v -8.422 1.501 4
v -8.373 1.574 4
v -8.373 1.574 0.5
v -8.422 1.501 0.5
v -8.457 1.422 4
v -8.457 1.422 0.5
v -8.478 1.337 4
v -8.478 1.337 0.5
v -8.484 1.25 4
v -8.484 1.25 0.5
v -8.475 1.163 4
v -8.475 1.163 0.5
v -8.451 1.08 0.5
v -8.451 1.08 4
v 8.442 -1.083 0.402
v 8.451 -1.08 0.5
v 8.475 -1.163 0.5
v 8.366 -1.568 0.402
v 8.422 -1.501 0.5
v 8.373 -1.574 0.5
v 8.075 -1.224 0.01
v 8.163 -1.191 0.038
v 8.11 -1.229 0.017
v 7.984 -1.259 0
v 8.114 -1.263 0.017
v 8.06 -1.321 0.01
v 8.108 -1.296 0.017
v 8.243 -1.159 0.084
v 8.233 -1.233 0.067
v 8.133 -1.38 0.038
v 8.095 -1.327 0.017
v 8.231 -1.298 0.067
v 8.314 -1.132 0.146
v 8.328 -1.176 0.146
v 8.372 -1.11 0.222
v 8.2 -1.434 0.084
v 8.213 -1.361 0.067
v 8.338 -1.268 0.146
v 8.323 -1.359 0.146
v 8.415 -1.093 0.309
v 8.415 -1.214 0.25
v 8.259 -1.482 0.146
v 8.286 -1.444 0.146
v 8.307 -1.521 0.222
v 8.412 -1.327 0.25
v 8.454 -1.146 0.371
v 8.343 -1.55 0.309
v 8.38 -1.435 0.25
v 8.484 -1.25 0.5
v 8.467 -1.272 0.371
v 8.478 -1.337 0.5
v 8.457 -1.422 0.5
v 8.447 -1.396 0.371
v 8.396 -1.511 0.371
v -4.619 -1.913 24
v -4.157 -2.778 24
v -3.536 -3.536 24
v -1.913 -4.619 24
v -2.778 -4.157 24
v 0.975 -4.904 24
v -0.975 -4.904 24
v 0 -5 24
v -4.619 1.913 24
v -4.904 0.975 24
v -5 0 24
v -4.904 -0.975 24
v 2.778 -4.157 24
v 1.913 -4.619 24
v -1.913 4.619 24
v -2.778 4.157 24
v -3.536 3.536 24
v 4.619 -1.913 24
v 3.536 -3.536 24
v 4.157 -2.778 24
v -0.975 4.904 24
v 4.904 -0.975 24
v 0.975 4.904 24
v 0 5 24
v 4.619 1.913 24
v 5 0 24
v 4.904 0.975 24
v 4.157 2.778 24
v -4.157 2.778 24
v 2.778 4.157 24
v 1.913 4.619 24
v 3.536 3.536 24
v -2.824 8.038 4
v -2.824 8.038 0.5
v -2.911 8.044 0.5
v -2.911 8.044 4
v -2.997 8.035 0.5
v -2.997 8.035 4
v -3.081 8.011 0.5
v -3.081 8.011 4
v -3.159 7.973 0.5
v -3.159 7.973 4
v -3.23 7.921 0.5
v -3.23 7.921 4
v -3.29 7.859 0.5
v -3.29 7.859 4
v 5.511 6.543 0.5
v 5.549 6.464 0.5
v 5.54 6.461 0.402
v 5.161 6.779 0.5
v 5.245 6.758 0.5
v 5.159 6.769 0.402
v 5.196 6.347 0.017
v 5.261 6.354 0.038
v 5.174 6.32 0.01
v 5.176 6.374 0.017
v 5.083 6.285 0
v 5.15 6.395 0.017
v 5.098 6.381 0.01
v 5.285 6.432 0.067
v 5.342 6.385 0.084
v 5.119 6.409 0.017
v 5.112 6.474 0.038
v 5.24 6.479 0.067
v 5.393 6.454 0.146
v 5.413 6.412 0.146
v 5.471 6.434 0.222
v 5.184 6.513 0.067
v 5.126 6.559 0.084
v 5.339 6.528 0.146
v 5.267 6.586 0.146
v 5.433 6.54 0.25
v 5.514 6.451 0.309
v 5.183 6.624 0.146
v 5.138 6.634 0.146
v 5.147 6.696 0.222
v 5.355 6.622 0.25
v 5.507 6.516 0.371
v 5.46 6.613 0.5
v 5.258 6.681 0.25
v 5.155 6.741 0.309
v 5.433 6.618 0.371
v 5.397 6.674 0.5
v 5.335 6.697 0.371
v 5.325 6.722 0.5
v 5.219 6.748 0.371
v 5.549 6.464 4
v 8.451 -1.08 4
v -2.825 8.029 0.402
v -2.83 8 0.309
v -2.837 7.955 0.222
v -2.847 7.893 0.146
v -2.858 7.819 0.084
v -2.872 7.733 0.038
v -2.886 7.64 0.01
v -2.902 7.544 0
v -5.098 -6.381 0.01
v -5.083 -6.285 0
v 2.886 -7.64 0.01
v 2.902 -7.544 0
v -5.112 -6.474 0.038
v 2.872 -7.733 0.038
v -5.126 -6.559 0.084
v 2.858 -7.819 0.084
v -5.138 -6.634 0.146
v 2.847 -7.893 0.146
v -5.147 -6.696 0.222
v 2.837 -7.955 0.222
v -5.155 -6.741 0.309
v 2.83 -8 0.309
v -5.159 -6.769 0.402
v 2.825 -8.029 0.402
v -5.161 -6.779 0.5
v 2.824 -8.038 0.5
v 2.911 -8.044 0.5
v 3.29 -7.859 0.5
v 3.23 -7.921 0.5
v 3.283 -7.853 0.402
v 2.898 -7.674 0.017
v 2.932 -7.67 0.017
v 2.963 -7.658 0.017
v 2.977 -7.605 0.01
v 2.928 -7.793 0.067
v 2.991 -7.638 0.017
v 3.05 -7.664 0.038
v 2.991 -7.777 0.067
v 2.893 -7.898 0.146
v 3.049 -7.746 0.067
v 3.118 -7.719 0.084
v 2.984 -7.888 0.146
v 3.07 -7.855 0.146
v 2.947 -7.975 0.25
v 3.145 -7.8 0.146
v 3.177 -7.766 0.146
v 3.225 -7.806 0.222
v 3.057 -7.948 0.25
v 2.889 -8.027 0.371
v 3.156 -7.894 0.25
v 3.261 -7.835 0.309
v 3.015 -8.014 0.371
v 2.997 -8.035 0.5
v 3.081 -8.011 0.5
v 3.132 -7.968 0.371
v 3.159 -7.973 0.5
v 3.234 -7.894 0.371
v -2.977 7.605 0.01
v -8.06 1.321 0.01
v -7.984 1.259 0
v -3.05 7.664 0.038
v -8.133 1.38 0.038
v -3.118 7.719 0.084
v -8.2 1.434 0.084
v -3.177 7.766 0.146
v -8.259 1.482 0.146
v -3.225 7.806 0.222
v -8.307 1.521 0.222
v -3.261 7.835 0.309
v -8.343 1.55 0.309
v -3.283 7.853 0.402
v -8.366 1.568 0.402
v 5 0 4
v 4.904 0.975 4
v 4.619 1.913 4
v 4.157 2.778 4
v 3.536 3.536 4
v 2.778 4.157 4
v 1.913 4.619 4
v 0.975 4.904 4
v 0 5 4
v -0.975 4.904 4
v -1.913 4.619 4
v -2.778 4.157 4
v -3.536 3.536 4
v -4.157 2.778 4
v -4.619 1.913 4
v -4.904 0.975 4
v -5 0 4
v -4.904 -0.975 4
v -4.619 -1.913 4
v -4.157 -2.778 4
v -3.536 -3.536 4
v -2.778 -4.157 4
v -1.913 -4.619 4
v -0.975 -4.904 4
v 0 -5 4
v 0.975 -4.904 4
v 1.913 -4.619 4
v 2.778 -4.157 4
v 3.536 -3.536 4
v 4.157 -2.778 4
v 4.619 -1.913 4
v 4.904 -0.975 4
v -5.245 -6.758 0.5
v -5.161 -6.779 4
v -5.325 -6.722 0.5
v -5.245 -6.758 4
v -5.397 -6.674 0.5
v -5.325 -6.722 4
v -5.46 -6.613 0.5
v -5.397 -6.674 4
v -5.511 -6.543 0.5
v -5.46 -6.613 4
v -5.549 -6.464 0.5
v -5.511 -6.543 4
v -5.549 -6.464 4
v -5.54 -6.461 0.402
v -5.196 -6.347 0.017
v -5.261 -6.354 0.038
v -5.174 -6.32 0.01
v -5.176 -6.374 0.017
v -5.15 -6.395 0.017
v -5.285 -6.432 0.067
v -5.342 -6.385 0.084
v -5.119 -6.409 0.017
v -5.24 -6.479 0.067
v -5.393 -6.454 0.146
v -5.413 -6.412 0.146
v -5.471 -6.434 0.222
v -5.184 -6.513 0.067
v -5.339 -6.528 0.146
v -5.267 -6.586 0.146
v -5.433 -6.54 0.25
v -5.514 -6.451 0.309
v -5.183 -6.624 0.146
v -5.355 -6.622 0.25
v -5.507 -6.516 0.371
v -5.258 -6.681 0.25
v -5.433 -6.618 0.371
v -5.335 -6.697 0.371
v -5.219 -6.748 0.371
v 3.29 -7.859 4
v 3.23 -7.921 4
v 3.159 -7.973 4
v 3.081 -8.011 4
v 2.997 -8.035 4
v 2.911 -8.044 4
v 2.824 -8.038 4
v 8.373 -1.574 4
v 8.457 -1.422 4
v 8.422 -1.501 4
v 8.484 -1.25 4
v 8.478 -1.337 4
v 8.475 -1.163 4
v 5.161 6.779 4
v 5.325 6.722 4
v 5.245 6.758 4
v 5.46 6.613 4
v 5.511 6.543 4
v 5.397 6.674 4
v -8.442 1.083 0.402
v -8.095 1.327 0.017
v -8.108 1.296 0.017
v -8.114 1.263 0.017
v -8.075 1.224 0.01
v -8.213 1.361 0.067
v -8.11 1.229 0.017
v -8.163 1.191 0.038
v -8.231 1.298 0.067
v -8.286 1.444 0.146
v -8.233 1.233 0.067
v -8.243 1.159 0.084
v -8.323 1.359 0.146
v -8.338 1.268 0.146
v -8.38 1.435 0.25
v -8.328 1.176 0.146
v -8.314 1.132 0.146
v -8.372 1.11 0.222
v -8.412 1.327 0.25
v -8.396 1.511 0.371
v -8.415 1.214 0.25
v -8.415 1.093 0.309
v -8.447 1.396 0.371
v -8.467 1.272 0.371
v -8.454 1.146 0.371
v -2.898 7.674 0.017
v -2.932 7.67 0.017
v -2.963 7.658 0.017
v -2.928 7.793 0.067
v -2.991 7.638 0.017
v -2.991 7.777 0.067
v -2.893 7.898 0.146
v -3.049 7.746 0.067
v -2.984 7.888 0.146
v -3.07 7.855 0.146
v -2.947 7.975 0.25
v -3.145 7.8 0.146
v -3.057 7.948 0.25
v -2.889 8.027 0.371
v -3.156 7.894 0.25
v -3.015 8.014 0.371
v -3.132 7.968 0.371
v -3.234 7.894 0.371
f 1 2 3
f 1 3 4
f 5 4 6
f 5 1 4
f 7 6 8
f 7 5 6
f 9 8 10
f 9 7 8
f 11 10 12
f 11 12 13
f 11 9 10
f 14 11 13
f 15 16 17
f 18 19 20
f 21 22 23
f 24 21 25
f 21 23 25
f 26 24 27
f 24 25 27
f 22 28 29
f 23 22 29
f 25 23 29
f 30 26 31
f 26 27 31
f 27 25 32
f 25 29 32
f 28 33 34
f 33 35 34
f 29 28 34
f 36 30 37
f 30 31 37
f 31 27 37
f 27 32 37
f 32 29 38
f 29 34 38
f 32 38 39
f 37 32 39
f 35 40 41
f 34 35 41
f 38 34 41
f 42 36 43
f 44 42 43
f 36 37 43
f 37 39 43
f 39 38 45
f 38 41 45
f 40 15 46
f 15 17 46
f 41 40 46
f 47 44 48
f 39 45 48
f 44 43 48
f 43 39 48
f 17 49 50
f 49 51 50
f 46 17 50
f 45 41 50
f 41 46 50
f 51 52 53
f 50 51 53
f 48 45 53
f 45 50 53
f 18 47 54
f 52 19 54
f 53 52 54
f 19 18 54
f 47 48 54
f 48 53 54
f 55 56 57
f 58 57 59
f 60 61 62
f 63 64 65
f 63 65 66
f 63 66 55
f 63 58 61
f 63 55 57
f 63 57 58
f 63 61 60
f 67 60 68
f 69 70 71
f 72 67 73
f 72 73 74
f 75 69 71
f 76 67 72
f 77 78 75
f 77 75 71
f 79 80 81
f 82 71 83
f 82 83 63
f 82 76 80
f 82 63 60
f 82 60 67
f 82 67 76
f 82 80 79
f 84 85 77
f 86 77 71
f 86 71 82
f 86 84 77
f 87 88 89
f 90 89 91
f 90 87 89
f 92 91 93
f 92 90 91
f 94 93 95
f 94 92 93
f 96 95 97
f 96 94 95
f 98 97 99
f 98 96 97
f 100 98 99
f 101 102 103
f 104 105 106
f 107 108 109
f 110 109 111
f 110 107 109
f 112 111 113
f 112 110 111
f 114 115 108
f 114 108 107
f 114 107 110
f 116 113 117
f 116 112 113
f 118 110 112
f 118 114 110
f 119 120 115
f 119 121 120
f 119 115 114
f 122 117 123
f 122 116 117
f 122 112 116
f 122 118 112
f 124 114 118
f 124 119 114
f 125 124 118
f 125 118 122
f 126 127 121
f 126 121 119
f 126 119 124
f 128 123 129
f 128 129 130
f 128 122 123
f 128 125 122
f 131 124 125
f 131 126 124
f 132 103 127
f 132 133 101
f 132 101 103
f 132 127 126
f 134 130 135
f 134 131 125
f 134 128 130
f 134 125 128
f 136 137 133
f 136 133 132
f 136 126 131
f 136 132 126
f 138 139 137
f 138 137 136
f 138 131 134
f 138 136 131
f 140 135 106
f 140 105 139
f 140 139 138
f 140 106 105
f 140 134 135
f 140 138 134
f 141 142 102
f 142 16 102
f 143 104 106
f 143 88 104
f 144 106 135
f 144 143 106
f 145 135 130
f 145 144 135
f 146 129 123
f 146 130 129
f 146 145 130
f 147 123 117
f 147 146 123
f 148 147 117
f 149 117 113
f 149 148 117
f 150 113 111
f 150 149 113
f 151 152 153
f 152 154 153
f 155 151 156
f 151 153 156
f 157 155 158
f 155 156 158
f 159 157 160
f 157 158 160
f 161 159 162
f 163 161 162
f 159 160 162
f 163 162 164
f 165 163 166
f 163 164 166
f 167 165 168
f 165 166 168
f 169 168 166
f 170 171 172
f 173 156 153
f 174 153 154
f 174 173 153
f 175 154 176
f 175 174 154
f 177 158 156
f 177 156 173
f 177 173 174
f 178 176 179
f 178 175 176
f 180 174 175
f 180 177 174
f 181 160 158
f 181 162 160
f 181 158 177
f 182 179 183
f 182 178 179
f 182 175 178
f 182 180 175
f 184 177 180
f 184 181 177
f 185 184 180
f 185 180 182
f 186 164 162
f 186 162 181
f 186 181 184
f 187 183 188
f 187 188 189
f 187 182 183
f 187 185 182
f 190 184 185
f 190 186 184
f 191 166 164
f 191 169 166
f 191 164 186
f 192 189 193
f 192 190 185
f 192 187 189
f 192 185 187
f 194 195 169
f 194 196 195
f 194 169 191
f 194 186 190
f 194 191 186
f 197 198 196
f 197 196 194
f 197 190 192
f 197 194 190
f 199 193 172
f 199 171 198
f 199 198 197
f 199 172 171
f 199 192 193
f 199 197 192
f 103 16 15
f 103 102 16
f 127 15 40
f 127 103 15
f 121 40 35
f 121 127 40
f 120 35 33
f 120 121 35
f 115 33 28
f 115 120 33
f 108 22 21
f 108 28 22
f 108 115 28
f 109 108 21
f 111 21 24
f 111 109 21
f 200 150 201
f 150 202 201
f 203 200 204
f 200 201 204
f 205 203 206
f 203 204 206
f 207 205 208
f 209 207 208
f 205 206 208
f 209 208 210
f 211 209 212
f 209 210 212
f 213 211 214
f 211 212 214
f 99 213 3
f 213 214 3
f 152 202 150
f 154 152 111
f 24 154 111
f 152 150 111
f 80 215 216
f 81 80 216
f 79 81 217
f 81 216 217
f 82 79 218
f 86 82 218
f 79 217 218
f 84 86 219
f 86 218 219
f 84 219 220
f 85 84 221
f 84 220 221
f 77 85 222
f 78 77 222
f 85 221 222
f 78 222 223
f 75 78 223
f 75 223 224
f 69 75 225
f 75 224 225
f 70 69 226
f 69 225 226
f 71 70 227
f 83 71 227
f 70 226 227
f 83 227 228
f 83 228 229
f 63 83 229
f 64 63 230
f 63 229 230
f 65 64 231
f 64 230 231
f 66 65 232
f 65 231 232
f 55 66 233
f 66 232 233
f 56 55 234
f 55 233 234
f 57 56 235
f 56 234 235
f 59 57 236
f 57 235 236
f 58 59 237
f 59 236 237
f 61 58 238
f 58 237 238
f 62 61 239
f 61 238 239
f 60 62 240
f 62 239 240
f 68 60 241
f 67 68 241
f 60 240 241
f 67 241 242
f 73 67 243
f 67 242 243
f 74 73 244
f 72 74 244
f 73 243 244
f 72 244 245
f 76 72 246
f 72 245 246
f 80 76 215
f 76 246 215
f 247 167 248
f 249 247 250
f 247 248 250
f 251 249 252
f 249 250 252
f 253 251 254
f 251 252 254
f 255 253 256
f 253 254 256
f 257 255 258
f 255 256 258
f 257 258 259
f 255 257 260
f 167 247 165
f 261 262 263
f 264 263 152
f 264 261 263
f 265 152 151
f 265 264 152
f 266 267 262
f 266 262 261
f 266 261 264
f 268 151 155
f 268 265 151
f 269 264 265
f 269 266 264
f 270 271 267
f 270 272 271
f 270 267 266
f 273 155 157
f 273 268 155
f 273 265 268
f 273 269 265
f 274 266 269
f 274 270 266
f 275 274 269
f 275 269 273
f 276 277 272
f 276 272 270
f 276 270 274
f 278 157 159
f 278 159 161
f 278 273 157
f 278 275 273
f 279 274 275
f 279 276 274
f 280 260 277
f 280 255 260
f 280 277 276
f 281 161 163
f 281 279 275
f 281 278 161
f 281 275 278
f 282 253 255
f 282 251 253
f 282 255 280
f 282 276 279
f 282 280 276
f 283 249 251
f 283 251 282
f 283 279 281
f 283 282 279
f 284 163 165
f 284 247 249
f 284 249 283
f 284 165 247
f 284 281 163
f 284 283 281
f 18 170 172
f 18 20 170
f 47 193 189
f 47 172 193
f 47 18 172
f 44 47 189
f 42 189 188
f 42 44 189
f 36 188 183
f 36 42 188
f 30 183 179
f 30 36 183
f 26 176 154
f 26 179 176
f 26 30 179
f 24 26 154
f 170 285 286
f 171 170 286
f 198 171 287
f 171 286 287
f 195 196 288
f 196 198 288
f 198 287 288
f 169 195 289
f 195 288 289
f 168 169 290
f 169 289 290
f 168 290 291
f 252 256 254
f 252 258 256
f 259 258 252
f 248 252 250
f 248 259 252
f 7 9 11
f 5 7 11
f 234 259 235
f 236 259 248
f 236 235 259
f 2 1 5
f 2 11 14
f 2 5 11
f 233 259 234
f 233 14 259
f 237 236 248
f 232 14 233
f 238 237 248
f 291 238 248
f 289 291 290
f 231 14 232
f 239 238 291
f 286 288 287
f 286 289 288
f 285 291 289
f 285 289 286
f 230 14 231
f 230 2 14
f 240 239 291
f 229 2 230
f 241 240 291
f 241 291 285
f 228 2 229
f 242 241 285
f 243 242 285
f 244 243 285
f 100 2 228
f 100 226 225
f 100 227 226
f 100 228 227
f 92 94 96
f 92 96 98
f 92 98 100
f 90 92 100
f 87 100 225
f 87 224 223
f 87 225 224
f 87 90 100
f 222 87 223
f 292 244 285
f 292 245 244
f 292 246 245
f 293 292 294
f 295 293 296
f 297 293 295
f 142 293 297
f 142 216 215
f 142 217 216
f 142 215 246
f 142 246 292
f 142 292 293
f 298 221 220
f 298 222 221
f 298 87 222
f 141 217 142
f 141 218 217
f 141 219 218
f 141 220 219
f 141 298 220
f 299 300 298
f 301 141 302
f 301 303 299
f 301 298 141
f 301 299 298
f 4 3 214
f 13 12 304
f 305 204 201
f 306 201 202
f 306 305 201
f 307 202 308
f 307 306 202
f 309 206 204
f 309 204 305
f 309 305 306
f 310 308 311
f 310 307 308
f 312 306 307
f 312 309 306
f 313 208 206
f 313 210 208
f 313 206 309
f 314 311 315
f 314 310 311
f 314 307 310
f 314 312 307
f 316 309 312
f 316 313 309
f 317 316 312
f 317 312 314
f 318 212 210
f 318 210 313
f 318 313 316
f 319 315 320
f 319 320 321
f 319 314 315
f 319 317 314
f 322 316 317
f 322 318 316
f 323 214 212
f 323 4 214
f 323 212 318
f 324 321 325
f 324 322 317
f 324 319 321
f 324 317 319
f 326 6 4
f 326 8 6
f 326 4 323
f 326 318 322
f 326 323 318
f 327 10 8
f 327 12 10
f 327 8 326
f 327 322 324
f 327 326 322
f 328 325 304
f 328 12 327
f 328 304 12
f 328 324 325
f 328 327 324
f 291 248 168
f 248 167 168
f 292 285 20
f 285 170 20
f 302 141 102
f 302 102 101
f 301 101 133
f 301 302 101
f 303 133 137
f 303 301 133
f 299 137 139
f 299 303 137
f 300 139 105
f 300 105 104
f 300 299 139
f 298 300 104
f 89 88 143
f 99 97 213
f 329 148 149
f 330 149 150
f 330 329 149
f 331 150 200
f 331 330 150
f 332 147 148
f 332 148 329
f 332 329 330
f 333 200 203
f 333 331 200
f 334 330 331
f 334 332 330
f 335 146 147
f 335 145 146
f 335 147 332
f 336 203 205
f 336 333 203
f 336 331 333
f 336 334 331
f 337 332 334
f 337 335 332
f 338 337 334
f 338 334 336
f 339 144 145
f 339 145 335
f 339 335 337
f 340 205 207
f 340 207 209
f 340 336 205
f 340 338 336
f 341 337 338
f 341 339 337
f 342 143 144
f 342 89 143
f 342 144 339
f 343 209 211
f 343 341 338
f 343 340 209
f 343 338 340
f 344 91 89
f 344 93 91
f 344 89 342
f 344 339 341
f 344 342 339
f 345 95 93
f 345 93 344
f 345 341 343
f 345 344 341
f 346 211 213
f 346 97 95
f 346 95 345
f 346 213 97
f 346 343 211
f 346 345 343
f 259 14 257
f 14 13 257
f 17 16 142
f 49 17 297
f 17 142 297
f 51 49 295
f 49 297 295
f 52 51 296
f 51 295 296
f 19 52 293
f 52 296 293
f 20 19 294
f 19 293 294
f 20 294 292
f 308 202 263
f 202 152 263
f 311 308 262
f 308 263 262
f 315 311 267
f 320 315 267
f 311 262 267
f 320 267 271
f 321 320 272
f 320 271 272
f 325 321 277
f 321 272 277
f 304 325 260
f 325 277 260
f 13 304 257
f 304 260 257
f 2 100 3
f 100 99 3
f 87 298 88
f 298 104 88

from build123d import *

# Parameters (mm, degrees)
F1_DEPTH = 4
F2_R     = 5
F3_DEPTH = 20
F4_R     = 0.5


with BuildPart() as f1:
    # F0 (on Top) → F1 (new body)
    with BuildSketch(Plane.XY):
        Polygon((8.554517, -1.349162), (5.445667, 6.733848), (-3.10885, 8.08301), (-8.554517, 1.349162), (-5.445667, -6.733848), (3.10885, -8.08301), align=None)
    extrude(amount=F1_DEPTH)

    # F2 (on face) → F3 (join)
    with BuildSketch(Plane.XY.offset(4)):
        Circle(F2_R)
    extrude(amount=F3_DEPTH)

    # F4
    f4_edges = [f1.edges().sort_by_distance(p)[0] for p in [
        (7.000092, 2.692343, 0),
        (1.168409, 7.408429, 0),
        (-5.831684, 4.716086, 0),
        (-7.000092, -2.692343, 0),
        (-1.168409, -7.408429, 0),
        (5.831684, -4.716086, 0),
        (8.554517, -1.349162, 2),
        (5.445667, 6.733848, 2),
        (-3.10885, 8.08301, 2),
        (3.10885, -8.08301, 2),
        (-8.554517, 1.349162, 2),
        (-5.445667, -6.733848, 2),
    ]]
    fillet(f4_edges, radius=F4_R)


solid = f1.part
